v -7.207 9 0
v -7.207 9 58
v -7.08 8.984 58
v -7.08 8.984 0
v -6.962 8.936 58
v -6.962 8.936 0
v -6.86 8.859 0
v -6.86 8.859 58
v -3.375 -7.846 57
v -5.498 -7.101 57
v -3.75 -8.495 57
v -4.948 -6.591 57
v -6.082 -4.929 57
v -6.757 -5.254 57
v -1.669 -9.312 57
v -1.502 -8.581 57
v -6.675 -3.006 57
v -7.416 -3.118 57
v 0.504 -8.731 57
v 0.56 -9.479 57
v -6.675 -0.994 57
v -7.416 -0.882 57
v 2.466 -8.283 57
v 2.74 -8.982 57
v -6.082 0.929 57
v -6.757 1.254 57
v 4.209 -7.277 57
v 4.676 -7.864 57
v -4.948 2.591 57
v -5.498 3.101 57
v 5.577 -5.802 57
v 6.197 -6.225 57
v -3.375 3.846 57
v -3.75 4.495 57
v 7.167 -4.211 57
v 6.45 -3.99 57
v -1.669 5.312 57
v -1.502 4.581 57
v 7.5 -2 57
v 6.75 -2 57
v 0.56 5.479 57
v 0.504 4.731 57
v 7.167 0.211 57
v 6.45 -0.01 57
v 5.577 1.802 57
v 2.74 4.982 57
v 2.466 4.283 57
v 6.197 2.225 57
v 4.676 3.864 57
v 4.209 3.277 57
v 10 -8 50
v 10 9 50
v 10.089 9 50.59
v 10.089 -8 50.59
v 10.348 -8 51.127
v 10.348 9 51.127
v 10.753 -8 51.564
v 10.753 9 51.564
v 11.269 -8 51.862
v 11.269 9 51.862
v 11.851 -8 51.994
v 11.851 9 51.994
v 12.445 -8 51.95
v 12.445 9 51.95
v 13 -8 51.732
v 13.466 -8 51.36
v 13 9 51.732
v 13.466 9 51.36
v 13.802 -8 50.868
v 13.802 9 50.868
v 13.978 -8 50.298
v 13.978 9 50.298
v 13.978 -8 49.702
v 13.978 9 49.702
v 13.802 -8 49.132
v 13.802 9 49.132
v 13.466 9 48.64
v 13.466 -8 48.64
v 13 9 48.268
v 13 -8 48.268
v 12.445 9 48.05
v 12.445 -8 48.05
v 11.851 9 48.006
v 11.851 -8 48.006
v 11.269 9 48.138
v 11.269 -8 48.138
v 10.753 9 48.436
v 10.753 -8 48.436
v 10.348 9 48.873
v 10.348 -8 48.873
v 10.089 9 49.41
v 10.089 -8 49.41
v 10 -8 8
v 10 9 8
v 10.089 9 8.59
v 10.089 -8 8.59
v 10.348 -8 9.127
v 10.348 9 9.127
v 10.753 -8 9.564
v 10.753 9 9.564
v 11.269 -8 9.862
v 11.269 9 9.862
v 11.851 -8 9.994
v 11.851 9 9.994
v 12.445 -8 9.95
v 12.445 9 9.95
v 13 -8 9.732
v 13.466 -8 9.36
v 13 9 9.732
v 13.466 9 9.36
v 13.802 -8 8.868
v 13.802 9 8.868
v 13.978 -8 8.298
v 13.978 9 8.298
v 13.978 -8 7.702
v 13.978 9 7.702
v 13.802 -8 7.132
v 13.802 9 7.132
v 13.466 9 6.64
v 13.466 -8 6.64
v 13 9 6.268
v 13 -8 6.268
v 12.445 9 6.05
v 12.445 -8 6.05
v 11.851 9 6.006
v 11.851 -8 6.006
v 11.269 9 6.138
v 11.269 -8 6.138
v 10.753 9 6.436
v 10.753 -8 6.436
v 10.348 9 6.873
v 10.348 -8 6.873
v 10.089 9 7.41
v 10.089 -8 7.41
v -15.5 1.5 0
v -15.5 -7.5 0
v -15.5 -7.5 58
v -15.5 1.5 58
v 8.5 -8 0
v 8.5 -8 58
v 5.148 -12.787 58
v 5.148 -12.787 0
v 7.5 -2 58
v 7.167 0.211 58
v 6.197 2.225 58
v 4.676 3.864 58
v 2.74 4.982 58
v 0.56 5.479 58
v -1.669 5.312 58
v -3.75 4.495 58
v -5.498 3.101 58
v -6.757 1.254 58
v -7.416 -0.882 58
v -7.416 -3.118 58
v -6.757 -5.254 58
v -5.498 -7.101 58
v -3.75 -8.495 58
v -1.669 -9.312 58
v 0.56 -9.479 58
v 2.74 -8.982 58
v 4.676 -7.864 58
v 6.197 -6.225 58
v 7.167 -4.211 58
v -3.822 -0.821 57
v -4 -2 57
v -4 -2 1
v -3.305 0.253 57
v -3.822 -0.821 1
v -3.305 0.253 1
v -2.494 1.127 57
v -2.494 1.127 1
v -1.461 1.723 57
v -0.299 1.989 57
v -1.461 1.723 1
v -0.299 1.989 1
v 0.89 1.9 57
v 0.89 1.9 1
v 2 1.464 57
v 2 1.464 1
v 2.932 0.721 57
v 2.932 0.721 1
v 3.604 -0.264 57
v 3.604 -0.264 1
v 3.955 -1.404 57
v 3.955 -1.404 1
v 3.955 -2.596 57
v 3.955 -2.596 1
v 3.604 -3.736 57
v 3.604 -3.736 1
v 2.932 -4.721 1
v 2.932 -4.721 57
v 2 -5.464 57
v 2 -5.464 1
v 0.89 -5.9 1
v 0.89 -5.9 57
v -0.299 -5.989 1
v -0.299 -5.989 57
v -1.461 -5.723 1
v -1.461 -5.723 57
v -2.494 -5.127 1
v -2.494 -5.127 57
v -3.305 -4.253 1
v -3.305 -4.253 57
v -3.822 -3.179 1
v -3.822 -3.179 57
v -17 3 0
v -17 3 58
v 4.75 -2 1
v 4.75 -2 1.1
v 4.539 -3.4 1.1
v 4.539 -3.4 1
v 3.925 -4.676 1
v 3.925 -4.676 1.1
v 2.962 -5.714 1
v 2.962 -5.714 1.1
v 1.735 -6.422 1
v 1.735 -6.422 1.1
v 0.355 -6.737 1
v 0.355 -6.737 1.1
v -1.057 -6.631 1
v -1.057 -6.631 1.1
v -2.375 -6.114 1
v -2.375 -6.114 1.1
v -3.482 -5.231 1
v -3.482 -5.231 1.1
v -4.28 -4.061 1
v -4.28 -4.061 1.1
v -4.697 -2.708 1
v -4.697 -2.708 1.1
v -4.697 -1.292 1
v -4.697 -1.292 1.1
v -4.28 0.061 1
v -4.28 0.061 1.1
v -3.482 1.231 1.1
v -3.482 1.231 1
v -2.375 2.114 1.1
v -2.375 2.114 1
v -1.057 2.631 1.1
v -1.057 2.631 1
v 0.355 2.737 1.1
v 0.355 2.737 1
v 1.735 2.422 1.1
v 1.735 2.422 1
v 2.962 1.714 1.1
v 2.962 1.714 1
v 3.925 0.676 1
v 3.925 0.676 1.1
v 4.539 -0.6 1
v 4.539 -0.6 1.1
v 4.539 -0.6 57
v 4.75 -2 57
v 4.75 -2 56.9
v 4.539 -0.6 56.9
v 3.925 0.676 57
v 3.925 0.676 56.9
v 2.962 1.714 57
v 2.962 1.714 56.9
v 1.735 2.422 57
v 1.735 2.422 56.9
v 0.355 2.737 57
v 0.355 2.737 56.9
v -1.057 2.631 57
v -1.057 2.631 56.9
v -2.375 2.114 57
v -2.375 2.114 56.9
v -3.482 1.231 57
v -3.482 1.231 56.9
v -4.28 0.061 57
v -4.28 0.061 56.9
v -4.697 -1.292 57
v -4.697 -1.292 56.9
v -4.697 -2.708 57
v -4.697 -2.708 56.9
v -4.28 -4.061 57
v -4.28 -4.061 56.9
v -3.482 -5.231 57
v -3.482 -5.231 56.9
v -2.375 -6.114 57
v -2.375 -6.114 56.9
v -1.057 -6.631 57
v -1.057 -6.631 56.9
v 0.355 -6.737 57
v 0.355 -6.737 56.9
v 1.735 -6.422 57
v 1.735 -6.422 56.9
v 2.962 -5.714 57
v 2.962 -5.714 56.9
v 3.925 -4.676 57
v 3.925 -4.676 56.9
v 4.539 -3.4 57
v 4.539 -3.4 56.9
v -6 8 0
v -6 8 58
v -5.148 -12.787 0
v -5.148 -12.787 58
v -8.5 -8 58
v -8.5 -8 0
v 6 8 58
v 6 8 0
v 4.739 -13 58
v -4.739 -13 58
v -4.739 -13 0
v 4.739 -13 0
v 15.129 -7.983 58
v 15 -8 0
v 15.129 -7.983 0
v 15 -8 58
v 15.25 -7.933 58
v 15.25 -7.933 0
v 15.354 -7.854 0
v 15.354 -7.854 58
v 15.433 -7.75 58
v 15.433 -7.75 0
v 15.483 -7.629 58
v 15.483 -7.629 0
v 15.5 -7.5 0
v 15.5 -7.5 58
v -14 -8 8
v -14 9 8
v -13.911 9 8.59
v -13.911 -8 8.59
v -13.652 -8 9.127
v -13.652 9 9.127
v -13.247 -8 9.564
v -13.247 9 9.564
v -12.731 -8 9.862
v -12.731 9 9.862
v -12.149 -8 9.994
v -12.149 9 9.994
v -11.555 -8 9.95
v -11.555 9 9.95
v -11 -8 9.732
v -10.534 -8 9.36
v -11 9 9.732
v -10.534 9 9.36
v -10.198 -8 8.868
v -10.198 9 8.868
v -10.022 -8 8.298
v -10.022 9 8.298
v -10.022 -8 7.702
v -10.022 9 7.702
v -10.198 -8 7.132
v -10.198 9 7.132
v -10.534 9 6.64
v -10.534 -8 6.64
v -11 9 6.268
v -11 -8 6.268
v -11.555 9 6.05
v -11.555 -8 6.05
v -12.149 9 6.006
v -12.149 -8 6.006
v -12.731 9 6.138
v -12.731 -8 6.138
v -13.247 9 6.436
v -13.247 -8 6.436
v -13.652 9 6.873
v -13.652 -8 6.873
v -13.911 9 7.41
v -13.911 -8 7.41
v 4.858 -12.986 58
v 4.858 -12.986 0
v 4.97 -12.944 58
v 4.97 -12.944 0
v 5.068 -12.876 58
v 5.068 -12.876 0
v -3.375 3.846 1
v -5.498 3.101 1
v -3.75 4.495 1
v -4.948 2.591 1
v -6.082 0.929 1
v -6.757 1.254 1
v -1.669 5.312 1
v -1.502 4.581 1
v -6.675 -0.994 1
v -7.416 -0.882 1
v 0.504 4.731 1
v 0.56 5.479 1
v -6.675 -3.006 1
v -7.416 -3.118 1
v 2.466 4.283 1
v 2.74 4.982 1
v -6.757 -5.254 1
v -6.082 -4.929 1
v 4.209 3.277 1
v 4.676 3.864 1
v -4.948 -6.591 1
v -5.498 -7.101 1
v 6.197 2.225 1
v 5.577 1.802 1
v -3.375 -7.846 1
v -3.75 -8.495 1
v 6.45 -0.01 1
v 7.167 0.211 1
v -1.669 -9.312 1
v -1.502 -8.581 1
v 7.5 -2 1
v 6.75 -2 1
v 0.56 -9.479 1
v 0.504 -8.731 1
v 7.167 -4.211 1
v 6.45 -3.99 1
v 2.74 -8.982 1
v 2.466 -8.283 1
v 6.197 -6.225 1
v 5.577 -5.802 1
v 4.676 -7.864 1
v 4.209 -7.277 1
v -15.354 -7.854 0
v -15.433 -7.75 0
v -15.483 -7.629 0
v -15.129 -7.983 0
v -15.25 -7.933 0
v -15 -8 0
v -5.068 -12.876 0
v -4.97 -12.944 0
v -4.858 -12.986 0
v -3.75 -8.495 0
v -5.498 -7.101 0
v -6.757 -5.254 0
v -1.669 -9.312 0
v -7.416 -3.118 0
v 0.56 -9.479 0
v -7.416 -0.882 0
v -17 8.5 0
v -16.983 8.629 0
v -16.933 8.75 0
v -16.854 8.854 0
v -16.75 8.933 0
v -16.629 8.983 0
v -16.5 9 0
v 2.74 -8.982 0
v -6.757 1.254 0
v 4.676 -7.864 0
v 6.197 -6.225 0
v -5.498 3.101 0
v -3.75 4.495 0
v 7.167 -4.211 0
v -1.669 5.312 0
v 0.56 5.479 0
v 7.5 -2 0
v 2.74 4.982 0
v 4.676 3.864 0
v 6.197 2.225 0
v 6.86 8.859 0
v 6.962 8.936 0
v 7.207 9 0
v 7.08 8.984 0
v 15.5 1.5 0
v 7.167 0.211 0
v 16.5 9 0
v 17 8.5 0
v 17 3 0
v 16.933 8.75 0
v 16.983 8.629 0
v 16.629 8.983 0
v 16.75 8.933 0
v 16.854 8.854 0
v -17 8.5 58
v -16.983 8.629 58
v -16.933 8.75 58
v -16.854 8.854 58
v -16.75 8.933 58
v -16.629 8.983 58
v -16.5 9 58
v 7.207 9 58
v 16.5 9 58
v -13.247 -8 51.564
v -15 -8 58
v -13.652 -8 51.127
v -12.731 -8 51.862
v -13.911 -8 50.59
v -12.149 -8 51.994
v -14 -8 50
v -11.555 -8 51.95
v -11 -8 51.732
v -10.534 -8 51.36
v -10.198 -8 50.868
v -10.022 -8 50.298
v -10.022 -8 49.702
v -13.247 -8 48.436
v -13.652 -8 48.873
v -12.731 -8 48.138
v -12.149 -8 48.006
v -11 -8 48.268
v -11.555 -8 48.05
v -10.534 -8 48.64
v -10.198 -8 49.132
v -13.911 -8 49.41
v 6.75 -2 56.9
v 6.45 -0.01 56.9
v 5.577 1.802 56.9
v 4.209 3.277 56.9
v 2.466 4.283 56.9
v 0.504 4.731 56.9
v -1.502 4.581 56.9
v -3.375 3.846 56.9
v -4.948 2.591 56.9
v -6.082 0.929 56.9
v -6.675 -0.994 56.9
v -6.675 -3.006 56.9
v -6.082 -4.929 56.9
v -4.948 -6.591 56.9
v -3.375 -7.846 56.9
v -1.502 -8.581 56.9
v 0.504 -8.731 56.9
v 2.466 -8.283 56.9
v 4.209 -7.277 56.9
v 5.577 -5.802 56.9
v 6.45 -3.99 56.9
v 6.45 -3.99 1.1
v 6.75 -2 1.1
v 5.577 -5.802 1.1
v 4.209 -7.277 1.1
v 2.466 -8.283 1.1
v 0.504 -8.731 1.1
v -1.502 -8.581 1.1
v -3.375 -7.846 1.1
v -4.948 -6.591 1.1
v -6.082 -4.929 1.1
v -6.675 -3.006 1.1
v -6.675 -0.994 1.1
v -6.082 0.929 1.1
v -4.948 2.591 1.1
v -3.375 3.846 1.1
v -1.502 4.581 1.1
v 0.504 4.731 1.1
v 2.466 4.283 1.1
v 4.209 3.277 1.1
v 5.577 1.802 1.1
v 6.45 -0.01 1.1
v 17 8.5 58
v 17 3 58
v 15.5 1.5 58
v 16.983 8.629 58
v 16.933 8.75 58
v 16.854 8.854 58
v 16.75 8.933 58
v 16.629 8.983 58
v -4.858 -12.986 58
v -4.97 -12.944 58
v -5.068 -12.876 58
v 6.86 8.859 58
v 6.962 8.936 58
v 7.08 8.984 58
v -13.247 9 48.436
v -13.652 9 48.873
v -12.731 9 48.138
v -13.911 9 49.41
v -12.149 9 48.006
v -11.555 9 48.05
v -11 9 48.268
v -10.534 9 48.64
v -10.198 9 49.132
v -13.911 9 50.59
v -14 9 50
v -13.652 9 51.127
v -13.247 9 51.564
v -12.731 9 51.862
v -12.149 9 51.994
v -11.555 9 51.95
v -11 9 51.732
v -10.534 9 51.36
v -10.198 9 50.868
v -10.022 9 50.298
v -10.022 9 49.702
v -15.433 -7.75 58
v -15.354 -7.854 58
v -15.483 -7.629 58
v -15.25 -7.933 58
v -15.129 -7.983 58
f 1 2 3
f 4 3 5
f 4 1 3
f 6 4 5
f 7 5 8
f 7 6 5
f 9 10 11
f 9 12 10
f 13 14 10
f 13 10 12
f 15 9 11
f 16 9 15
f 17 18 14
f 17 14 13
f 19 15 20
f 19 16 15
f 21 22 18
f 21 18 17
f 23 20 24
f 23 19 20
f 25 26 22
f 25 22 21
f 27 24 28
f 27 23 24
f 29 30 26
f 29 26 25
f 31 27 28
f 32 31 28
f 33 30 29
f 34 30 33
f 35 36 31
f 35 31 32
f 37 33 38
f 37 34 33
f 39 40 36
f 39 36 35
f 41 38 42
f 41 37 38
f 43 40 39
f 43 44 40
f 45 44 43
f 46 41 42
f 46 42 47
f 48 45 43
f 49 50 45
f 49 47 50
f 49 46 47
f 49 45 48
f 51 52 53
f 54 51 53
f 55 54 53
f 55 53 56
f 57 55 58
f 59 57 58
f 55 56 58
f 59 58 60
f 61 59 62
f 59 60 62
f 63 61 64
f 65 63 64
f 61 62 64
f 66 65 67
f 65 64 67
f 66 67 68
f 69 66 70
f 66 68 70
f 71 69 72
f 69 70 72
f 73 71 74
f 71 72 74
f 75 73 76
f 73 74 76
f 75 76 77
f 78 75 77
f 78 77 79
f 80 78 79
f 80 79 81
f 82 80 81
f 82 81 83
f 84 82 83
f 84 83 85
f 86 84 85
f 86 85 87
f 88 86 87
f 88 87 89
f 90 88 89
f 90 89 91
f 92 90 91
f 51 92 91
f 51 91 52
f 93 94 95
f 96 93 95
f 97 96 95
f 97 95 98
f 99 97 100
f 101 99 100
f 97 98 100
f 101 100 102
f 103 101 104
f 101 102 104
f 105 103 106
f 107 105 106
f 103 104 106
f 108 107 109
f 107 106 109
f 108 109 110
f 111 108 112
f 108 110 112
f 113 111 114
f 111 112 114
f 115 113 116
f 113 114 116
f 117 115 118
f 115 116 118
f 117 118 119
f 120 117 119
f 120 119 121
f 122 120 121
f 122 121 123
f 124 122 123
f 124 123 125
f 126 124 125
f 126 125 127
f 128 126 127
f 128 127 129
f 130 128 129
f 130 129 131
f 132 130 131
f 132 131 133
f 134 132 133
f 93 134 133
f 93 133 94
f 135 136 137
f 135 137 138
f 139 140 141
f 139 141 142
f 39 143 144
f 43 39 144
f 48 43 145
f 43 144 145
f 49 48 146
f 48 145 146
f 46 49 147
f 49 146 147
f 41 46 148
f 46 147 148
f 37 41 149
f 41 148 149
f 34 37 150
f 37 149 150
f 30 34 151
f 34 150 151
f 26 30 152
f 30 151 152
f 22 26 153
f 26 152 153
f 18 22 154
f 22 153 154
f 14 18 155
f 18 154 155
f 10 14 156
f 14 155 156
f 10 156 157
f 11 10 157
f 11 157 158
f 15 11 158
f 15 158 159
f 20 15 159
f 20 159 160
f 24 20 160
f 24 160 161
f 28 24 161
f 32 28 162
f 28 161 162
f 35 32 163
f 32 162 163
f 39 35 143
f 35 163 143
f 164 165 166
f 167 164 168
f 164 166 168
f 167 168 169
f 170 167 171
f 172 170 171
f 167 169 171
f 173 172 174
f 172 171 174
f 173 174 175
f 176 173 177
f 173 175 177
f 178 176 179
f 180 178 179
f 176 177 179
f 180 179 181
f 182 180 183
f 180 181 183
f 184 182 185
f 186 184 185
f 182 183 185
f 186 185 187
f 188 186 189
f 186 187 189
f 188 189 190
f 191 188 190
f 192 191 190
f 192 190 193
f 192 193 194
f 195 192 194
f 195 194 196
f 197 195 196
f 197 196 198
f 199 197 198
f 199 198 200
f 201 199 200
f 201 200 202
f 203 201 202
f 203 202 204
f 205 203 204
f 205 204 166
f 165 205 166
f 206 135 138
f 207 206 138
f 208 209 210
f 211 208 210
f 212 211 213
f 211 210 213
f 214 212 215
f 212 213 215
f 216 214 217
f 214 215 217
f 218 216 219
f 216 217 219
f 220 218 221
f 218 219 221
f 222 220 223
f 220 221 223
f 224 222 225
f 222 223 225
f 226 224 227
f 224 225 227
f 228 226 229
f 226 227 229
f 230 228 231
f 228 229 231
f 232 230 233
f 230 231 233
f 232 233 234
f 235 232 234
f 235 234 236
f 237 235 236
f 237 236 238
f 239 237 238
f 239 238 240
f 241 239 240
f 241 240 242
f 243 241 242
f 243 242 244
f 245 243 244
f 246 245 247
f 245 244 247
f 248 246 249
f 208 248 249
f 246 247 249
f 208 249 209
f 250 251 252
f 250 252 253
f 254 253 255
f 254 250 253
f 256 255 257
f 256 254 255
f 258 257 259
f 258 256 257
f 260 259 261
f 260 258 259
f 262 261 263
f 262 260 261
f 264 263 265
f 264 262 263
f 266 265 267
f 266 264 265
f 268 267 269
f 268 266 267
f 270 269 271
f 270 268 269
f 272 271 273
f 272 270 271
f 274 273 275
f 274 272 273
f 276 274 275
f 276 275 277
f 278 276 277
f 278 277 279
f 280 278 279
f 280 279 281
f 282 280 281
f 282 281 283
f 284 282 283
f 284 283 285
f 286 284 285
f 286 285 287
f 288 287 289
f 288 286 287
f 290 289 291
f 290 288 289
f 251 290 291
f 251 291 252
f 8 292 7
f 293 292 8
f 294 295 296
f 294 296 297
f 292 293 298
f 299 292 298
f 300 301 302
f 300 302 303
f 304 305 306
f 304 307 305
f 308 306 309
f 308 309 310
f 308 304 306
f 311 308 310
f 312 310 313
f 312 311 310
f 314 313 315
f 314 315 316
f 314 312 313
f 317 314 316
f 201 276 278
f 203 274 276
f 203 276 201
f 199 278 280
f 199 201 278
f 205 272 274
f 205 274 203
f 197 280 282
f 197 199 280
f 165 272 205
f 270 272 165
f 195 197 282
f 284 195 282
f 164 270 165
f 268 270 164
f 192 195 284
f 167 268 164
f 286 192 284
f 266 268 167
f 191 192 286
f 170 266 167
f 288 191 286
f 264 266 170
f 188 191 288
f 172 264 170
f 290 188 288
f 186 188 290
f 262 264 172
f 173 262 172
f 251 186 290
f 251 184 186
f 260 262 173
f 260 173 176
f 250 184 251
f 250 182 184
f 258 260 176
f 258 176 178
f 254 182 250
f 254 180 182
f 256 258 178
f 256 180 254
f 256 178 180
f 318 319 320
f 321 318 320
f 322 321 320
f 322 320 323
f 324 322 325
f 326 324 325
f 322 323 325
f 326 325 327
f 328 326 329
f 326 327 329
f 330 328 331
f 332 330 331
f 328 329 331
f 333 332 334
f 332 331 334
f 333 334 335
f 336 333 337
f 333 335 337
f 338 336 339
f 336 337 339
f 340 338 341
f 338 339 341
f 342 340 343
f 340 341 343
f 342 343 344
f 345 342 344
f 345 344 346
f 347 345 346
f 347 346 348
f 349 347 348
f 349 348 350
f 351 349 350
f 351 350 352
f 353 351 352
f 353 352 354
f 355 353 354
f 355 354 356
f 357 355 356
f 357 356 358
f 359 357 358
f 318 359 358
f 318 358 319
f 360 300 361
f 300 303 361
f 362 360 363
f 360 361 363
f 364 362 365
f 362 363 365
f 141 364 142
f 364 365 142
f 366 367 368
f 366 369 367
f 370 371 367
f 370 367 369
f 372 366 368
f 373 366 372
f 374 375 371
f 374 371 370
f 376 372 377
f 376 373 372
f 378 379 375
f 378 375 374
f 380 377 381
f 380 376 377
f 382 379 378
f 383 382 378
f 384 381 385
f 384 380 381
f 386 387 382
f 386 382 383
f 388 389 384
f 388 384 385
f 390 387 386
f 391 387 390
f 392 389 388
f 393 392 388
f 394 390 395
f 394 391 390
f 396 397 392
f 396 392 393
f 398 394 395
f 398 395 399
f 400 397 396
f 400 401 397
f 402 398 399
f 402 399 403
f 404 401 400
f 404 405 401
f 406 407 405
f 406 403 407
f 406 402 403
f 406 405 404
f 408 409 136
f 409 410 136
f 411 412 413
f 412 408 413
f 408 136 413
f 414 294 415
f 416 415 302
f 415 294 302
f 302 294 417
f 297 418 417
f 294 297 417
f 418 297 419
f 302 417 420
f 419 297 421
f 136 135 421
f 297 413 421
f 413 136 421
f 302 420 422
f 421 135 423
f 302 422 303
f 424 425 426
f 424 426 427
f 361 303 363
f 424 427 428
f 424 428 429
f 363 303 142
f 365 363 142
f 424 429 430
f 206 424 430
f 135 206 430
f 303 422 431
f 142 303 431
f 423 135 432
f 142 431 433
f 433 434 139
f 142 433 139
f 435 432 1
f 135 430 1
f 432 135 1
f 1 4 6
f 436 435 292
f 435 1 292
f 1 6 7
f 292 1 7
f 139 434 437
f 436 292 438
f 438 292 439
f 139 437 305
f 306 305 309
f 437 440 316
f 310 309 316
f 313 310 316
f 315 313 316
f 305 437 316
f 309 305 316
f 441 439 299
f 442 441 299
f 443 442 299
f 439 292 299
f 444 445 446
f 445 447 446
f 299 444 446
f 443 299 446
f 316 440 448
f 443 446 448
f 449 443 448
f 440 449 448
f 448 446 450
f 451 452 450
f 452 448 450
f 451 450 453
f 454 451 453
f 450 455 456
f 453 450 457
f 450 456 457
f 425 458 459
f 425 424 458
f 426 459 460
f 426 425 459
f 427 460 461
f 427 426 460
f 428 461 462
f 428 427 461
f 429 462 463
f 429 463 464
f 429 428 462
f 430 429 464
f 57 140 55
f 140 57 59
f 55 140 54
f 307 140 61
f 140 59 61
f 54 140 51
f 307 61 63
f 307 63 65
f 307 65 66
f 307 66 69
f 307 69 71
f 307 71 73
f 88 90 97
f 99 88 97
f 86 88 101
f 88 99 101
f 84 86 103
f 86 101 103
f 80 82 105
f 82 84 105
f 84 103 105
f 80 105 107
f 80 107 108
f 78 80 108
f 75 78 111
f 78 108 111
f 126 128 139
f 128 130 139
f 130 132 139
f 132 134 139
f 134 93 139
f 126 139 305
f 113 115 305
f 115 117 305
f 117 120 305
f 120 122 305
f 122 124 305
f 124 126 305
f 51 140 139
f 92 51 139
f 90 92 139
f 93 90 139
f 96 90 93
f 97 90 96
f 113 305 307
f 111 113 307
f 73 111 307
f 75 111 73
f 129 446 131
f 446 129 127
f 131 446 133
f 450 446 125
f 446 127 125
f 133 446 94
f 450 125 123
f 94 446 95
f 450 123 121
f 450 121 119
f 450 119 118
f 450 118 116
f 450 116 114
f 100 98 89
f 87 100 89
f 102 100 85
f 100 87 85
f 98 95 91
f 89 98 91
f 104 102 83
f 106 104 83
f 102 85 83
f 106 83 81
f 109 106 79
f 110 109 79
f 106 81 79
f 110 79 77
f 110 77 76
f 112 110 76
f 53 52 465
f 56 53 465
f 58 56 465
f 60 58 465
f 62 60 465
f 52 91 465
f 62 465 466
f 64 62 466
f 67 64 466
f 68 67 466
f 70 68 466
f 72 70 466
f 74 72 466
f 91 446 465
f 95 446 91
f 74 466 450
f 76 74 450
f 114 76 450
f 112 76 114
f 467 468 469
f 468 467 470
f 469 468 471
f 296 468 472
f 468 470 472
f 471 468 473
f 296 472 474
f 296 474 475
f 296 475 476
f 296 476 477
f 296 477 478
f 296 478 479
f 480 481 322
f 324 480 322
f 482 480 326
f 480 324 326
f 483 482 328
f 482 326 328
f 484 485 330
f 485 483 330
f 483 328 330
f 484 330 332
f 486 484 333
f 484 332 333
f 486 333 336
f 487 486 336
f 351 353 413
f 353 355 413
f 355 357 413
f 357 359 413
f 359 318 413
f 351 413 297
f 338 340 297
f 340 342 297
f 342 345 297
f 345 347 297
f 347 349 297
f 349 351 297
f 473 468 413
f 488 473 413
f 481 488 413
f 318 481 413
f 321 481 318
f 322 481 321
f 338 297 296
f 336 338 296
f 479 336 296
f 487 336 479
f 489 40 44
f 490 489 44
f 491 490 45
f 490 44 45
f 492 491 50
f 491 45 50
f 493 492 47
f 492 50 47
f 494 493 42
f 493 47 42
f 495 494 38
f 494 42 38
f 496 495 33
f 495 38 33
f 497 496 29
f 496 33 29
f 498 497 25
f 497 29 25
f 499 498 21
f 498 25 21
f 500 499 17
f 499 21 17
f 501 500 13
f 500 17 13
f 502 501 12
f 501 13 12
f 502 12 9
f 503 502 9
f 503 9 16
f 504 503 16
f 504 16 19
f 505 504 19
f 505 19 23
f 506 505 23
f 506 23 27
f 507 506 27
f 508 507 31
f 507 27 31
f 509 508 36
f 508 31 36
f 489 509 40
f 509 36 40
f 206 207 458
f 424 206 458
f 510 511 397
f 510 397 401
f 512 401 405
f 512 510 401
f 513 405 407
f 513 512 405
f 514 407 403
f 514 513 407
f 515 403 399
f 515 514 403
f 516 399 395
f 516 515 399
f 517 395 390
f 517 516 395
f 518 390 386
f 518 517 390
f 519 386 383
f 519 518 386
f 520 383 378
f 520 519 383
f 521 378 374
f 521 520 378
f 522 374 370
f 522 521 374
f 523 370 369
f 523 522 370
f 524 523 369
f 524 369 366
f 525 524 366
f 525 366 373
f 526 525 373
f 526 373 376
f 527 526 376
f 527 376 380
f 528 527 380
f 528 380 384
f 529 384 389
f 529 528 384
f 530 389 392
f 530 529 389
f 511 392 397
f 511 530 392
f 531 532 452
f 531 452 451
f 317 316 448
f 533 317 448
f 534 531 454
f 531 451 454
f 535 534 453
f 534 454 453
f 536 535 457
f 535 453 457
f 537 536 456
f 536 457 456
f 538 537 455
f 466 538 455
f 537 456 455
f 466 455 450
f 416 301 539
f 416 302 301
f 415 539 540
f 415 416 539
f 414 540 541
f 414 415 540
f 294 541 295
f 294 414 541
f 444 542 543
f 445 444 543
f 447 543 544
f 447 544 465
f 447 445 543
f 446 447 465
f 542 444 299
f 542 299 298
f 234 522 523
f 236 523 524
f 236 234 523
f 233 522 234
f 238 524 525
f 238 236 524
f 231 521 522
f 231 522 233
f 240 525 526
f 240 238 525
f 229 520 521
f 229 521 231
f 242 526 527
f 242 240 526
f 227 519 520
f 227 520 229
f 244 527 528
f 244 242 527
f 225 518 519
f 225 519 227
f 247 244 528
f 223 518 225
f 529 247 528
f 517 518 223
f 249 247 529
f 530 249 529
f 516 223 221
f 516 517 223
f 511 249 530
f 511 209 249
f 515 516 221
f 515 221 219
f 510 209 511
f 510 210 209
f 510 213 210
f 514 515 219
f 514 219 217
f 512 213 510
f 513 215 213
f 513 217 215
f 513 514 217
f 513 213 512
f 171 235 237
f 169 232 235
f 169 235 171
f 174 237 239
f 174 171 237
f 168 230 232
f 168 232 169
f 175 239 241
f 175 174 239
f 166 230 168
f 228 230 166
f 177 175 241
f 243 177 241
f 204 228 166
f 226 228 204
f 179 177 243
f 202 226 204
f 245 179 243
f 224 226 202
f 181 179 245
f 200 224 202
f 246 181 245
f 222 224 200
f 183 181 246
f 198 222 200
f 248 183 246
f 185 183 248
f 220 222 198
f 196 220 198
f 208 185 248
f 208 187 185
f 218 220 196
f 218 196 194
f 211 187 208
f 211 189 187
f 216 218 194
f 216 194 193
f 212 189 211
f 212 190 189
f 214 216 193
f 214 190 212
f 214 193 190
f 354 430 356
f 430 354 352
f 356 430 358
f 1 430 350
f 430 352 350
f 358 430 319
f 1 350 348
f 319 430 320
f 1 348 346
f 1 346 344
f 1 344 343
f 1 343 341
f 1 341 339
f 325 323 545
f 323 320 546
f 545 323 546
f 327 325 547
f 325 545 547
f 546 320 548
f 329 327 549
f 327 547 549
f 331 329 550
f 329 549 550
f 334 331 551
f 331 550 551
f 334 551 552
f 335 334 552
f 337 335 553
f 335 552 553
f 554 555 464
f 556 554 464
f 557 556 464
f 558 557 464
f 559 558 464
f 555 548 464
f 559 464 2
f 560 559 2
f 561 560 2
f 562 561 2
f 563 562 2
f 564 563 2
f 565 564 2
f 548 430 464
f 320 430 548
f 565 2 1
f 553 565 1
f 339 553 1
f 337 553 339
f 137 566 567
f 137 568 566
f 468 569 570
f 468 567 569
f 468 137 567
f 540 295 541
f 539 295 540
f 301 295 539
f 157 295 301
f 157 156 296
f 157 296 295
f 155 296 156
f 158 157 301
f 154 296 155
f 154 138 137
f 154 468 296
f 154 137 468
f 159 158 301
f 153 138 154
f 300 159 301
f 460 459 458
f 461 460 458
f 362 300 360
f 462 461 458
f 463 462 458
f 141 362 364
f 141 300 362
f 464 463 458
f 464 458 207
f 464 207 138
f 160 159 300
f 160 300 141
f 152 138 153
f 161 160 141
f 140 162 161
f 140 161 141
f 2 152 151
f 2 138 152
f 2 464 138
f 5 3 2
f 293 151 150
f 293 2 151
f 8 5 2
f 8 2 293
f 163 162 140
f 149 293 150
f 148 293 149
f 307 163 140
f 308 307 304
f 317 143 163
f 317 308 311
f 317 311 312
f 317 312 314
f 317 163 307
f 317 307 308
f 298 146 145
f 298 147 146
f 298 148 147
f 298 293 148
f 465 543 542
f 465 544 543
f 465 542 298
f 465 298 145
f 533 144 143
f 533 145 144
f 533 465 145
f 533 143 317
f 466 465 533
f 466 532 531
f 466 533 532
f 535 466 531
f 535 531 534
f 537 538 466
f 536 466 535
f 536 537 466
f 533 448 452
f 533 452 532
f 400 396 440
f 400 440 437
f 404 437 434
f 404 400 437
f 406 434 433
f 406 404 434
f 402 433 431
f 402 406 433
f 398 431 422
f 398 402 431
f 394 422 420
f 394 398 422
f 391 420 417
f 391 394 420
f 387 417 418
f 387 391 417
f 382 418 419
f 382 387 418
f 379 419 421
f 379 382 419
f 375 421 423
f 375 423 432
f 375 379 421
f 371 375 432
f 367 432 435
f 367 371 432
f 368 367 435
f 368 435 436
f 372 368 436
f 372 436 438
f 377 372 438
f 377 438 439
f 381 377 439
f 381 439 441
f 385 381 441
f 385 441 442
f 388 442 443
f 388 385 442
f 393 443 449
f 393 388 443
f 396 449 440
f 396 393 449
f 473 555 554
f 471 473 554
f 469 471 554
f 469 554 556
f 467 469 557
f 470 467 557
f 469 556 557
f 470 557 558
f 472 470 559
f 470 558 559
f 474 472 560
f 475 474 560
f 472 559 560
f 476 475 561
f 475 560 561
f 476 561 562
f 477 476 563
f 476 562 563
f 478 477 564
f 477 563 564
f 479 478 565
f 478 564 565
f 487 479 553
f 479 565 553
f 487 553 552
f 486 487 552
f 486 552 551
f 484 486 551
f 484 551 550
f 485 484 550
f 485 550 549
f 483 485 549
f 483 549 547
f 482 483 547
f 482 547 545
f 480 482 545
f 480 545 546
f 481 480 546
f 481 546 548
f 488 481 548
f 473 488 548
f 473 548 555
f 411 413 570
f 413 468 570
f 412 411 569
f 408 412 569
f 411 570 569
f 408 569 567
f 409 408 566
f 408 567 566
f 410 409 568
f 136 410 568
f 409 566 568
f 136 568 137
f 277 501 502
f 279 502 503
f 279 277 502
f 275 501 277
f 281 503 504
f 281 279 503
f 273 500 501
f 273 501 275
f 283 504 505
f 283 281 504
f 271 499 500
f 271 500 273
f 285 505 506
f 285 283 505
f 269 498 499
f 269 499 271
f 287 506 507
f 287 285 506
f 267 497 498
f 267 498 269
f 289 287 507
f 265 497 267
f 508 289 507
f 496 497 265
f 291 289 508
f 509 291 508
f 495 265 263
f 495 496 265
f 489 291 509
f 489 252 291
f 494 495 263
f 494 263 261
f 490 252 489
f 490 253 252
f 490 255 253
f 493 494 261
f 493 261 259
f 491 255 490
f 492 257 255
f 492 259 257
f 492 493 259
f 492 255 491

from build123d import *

# Parameters (mm, degrees)
SKETCH1_W           = 31
SKETCH1_H           = 16
BOSS_EXTRUDE1_DEPTH = 58
SKETCH2_W           = 17
SKETCH2_H           = 21
BOSS_EXTRUDE2_DEPTH = 58
SKETCH3_W           = 10
SKETCH3_H           = 6
BOSS_EXTRUDE3_DEPTH = 58
CHAMFER1_SIZE       = 1
CHAMFER2_SIZE       = 1.5
CHAMFER5_SIZE2      = 3.501037691
CHAMFER5_SIZE       = 5
CHAMFER6_SIZE2      = 5
CHAMFER6_SIZE       = 3.501037691
SKETCH4_R           = 7.5
CUT_EXTRUDE1_DEPTH  = 1
CUT_EXTRUDE2_START  = -1
SKETCH5_R           = 7.5
CUT_EXTRUDE2_DEPTH  = 1
SKETCH6_R           = 4
CUT_EXTRUDE3_DEPTH  = 58
SKETCH7_R           = 2
CUT_EXTRUDE4_DEPTH  = 20
SKETCH8_R           = 6.75
SKETCH8_R_2         = 4.75
CUT_EXTRUDE5_DEPTH  = 0.1
CUT_EXTRUDE6_START  = -0.1
SKETCH9_R           = 6.75
SKETCH9_R_2         = 4.75
CUT_EXTRUDE6_DEPTH  = 0.1
FILLET1_R           = 0.5
FILLET2_START       = -1
FILLET2_DEPTH       = 60


with BuildPart() as part:
    # Sketch1 → Boss-Extrude1 (new body)
    with BuildSketch(Plane.XY):
        Rectangle(SKETCH1_W, SKETCH1_H)
    extrude(amount=BOSS_EXTRUDE1_DEPTH)

    # Sketch2 → Boss-Extrude2 (add)
    with BuildSketch(Plane.XY.offset(58)):
        with Locations((0, -2.5)):
            Rectangle(SKETCH2_W, SKETCH2_H)
    extrude(amount=-BOSS_EXTRUDE2_DEPTH)

    # Sketch3 → Boss-Extrude3 (add)
    with BuildSketch(Plane.XY.offset(58)):
        with Locations((-12, 6)):
            Rectangle(SKETCH3_W, SKETCH3_H)
        with Locations((12, 6)):
            Rectangle(SKETCH3_W, SKETCH3_H)
    extrude(amount=-BOSS_EXTRUDE3_DEPTH)

    # Chamfer1
    chamfer1_edges = [part.edges().sort_by_distance(p)[0] for p in [
        (7, 8, 29),
        (-7, 8, 29),
    ]]
    chamfer(chamfer1_edges, length=CHAMFER1_SIZE - 0.0001)  # a hair under: the kernel refuses the full size

    # Chamfer2
    chamfer2_edges = [part.edges().sort_by_distance(p)[0] for p in [
        (15.5, 3, 29),
        (-15.5, 3, 29),
    ]]
    chamfer(chamfer2_edges, length=CHAMFER2_SIZE - 0.0001)  # a hair under: the kernel refuses the full size

    # Chamfer5
    chamfer5_edges = [part.edges().sort_by_distance(p)[0] for p in [
        (-8.5, -13, 29),
    ]]
    chamfer5_side = [part.faces().sort_by_distance(p)[0] for p in [
        (-8.5, -12.929979246, 29),
    ]]
    chamfer(chamfer5_edges, length=CHAMFER5_SIZE - 0.0001, length2=CHAMFER5_SIZE2 - 0.0001, reference=chamfer5_side[0])  # a hair under: the kernel refuses the full size

    # Chamfer6
    chamfer6_edges = [part.edges().sort_by_distance(p)[0] for p in [
        (8.5, -13, 29),
    ]]
    chamfer6_side = [part.faces().sort_by_distance(p)[0] for p in [
        (8.429979246, -13, 29),
    ]]
    chamfer(chamfer6_edges, length=CHAMFER6_SIZE - 0.0001, length2=CHAMFER6_SIZE2 - 0.0001, reference=chamfer6_side[0])  # a hair under: the kernel refuses the full size

    # Sketch4 → Cut-Extrude1 (cut)
    with BuildSketch(Plane.XY.offset(58)):
        with Locations((0, -2)):
            Circle(SKETCH4_R)
    extrude(amount=-CUT_EXTRUDE1_DEPTH, mode=Mode.SUBTRACT)

    # Sketch5 → Cut-Extrude2 (cut)
    with BuildSketch(Plane(origin=(0, 0, 0), x_dir=(-1, 0, 0), z_dir=(0, 0, -1)).offset(CUT_EXTRUDE2_START)):
        with Locations(Location((0, -2, 0), (0, 0, 180))):
            Circle(SKETCH5_R)
    extrude(amount=CUT_EXTRUDE2_DEPTH, mode=Mode.SUBTRACT)

    # Sketch6 → Cut-Extrude3 (cut)
    with BuildSketch(Plane(origin=(0, 0, 1), x_dir=(-1, 0, 0), z_dir=(0, 0, -1))):
        with Locations((0, -2)):
            Circle(SKETCH6_R)
    extrude(amount=-CUT_EXTRUDE3_DEPTH, mode=Mode.SUBTRACT)

    # Sketch7 → Cut-Extrude4 (cut)
    with BuildSketch(Plane(origin=(0, 9, 0), x_dir=(1, 0, 0), z_dir=(0, 1, 0))):
        with Locations(Location((-12, -8, 0), (0, 0, 180))):
            Circle(SKETCH7_R)
        with Locations(Location((12, -8, 0), (0, 0, 180))):
            Circle(SKETCH7_R)
        with Locations(Location((12, -50, 0), (0, 0, 180))):
            Circle(SKETCH7_R)
        with Locations(Location((-12, -50, 0), (0, 0, 180))):
            Circle(SKETCH7_R)
    extrude(amount=-CUT_EXTRUDE4_DEPTH, mode=Mode.SUBTRACT)

    # Sketch8 → Cut-Extrude5 (cut)
    with BuildSketch(Plane.XY.offset(57)):
        with Locations((0, -2)):
            Circle(SKETCH8_R)
        with Locations((0, -2)):
            Circle(SKETCH8_R_2, mode=Mode.SUBTRACT)
    extrude(amount=-CUT_EXTRUDE5_DEPTH, mode=Mode.SUBTRACT)

    # Sketch9 → Cut-Extrude6 (cut)
    with BuildSketch(Plane(origin=(0, 0, 1), x_dir=(-1, 0, 0), z_dir=(0, 0, -1)).offset(CUT_EXTRUDE6_START)):
        with Locations(Location((0, -2, 0), (0, 0, 180))):
            Circle(SKETCH9_R)
        with Locations(Location((0, -2, 0), (0, 0, 180))):
            Circle(SKETCH9_R_2, mode=Mode.SUBTRACT)
    extrude(amount=CUT_EXTRUDE6_DEPTH, mode=Mode.SUBTRACT)

    # Fillet1
    fillet1_edges = [part.edges().sort_by_distance(p)[0] for p in [
        (-4.999062309, -13, 29),
        (4.999062309, -13, 29),
        (-17, 9, 29),
        (17, 9, 29),
        (15.5, -8, 29),
        (-15.5, -8, 29),
    ]]
    fillet(fillet1_edges, radius=FILLET1_R)

    # Fillet2: read off the stored shape, not the designer's step
    # Fillet2 outline → Fillet2 (cut)
    with BuildSketch(Plane.XY.offset(FILLET2_START)):
        with BuildLine():
            Line((7, 9), (6.853553391, 8.853553391))
            ThreePointArc((6.853553391, 8.853553391), (7.015765065, 8.961939766), (7.207106781, 9))
            Line((7.207106781, 9), (7, 9))
        make_face()
        with BuildLine():
            Line((-7, 9), (-7.207106781, 9))
            ThreePointArc((-7.207106781, 9), (-7.015765065, 8.961939766), (-6.853553391, 8.853553391))
            Line((-6.853553391, 8.853553391), (-7, 9))
        make_face()
    extrude(amount=FILLET2_DEPTH, mode=Mode.SUBTRACT)


solid = part.part
